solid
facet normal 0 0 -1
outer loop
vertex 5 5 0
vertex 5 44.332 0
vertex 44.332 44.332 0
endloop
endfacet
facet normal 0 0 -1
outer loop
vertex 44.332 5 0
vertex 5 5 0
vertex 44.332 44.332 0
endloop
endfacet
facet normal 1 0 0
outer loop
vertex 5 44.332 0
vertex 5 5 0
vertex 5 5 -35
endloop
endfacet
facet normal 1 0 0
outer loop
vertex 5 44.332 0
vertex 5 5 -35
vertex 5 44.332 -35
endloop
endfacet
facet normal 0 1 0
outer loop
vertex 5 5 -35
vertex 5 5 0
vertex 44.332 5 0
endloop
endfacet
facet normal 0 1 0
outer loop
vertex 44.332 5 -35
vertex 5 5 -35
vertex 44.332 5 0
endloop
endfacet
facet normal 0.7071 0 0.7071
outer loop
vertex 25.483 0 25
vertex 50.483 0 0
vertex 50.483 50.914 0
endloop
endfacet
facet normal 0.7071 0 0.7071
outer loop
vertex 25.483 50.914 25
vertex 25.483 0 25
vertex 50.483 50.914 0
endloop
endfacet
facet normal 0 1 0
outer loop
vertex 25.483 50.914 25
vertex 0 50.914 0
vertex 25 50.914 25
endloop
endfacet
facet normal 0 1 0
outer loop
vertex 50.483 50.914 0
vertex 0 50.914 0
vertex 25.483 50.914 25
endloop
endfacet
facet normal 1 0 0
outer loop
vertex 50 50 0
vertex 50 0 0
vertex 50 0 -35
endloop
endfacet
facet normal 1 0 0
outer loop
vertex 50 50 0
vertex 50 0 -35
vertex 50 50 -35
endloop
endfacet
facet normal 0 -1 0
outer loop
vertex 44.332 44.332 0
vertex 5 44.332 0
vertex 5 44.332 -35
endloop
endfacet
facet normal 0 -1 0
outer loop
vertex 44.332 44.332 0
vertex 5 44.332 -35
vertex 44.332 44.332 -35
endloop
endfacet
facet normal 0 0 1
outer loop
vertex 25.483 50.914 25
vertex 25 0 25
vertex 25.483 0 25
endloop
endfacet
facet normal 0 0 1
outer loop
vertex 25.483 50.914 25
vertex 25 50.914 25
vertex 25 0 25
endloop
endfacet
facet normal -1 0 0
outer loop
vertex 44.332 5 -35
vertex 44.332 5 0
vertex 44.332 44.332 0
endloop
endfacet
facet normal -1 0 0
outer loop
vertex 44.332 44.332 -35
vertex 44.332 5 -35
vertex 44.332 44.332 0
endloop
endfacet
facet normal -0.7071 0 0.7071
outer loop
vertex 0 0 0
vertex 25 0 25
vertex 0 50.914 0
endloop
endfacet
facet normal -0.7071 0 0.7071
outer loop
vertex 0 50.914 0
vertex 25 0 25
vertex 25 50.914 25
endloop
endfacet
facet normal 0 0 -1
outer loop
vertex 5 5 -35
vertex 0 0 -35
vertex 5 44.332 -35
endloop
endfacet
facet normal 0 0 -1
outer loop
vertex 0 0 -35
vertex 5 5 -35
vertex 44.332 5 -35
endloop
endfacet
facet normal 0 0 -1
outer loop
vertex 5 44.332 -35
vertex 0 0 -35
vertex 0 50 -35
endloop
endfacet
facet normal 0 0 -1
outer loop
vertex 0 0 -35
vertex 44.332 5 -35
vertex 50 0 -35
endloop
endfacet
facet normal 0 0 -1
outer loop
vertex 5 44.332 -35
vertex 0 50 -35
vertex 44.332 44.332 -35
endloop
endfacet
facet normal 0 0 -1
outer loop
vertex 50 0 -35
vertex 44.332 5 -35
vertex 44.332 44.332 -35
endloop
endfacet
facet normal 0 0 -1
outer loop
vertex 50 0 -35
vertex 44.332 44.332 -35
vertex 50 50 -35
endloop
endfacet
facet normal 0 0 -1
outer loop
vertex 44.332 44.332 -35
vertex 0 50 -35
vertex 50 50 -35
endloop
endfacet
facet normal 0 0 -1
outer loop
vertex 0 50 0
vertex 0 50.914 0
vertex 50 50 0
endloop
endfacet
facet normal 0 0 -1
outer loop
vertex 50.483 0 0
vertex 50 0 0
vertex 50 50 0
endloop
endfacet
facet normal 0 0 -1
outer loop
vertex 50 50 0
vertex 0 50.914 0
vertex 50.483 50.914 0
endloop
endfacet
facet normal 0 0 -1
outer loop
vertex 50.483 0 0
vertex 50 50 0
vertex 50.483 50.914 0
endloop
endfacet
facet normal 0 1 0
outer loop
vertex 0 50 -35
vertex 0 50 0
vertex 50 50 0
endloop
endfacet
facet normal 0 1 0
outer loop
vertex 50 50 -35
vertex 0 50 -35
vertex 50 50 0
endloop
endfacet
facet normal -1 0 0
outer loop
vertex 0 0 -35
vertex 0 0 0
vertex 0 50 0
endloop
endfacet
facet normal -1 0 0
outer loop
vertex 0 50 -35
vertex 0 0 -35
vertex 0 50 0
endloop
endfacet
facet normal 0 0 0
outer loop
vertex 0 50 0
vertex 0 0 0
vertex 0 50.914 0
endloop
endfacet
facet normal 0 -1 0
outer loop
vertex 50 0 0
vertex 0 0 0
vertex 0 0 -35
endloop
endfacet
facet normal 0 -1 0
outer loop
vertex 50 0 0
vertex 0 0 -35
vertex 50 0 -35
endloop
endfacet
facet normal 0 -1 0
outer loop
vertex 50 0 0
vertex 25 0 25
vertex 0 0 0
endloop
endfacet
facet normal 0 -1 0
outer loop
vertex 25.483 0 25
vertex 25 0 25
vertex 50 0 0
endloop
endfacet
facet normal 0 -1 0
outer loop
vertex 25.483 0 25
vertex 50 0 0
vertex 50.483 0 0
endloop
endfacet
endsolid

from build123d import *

# Parameters (mm, degrees)
F1_W     = 50.4830703139
F1_H     = 50.9135648608
F2_DEPTH = 25
F0_W     = 50
F0_H     = 50
F0_W_2   = 39.3322317418
F0_H_2   = 39.3322317418
F3_DEPTH = 35
F4_SIZE2 = 24.99999
F4_SIZE  = 24.99999


# Not quite as in the source:
# - a fillet or chamfer is up to 0.001 mm smaller than in the source, because OpenCascade refuses the exact size


with BuildPart() as f2:
    # F1 (on Top) → F2 (new body)
    with BuildSketch(Plane.XY):
        with Locations((25.241535157, 25.4567824304)):
            Rectangle(F1_W, F1_H)
    extrude(amount=F2_DEPTH)

    # F0 (on Top) → F3 (join)
    with BuildSketch(Plane.XY):
        with Locations((25, 25)):
            Rectangle(F0_W, F0_H)
        with Locations((24.6661158709, 24.6661158709)):
            Rectangle(F0_W_2, F0_H_2, mode=Mode.SUBTRACT)
    extrude(amount=-F3_DEPTH)

    # F4 (size 25 and 25 in the source; OpenCascade refuses exactly that, so slightly less here)
    f4_edges = [f2.edges().sort_by_distance(p)[0] for p in [
        (50.48307, 25.456782, 25),
        (0, 25.456782, 25),
    ]]
    chamfer(f4_edges, length=F4_SIZE, length2=F4_SIZE2)


solid = f2.part
